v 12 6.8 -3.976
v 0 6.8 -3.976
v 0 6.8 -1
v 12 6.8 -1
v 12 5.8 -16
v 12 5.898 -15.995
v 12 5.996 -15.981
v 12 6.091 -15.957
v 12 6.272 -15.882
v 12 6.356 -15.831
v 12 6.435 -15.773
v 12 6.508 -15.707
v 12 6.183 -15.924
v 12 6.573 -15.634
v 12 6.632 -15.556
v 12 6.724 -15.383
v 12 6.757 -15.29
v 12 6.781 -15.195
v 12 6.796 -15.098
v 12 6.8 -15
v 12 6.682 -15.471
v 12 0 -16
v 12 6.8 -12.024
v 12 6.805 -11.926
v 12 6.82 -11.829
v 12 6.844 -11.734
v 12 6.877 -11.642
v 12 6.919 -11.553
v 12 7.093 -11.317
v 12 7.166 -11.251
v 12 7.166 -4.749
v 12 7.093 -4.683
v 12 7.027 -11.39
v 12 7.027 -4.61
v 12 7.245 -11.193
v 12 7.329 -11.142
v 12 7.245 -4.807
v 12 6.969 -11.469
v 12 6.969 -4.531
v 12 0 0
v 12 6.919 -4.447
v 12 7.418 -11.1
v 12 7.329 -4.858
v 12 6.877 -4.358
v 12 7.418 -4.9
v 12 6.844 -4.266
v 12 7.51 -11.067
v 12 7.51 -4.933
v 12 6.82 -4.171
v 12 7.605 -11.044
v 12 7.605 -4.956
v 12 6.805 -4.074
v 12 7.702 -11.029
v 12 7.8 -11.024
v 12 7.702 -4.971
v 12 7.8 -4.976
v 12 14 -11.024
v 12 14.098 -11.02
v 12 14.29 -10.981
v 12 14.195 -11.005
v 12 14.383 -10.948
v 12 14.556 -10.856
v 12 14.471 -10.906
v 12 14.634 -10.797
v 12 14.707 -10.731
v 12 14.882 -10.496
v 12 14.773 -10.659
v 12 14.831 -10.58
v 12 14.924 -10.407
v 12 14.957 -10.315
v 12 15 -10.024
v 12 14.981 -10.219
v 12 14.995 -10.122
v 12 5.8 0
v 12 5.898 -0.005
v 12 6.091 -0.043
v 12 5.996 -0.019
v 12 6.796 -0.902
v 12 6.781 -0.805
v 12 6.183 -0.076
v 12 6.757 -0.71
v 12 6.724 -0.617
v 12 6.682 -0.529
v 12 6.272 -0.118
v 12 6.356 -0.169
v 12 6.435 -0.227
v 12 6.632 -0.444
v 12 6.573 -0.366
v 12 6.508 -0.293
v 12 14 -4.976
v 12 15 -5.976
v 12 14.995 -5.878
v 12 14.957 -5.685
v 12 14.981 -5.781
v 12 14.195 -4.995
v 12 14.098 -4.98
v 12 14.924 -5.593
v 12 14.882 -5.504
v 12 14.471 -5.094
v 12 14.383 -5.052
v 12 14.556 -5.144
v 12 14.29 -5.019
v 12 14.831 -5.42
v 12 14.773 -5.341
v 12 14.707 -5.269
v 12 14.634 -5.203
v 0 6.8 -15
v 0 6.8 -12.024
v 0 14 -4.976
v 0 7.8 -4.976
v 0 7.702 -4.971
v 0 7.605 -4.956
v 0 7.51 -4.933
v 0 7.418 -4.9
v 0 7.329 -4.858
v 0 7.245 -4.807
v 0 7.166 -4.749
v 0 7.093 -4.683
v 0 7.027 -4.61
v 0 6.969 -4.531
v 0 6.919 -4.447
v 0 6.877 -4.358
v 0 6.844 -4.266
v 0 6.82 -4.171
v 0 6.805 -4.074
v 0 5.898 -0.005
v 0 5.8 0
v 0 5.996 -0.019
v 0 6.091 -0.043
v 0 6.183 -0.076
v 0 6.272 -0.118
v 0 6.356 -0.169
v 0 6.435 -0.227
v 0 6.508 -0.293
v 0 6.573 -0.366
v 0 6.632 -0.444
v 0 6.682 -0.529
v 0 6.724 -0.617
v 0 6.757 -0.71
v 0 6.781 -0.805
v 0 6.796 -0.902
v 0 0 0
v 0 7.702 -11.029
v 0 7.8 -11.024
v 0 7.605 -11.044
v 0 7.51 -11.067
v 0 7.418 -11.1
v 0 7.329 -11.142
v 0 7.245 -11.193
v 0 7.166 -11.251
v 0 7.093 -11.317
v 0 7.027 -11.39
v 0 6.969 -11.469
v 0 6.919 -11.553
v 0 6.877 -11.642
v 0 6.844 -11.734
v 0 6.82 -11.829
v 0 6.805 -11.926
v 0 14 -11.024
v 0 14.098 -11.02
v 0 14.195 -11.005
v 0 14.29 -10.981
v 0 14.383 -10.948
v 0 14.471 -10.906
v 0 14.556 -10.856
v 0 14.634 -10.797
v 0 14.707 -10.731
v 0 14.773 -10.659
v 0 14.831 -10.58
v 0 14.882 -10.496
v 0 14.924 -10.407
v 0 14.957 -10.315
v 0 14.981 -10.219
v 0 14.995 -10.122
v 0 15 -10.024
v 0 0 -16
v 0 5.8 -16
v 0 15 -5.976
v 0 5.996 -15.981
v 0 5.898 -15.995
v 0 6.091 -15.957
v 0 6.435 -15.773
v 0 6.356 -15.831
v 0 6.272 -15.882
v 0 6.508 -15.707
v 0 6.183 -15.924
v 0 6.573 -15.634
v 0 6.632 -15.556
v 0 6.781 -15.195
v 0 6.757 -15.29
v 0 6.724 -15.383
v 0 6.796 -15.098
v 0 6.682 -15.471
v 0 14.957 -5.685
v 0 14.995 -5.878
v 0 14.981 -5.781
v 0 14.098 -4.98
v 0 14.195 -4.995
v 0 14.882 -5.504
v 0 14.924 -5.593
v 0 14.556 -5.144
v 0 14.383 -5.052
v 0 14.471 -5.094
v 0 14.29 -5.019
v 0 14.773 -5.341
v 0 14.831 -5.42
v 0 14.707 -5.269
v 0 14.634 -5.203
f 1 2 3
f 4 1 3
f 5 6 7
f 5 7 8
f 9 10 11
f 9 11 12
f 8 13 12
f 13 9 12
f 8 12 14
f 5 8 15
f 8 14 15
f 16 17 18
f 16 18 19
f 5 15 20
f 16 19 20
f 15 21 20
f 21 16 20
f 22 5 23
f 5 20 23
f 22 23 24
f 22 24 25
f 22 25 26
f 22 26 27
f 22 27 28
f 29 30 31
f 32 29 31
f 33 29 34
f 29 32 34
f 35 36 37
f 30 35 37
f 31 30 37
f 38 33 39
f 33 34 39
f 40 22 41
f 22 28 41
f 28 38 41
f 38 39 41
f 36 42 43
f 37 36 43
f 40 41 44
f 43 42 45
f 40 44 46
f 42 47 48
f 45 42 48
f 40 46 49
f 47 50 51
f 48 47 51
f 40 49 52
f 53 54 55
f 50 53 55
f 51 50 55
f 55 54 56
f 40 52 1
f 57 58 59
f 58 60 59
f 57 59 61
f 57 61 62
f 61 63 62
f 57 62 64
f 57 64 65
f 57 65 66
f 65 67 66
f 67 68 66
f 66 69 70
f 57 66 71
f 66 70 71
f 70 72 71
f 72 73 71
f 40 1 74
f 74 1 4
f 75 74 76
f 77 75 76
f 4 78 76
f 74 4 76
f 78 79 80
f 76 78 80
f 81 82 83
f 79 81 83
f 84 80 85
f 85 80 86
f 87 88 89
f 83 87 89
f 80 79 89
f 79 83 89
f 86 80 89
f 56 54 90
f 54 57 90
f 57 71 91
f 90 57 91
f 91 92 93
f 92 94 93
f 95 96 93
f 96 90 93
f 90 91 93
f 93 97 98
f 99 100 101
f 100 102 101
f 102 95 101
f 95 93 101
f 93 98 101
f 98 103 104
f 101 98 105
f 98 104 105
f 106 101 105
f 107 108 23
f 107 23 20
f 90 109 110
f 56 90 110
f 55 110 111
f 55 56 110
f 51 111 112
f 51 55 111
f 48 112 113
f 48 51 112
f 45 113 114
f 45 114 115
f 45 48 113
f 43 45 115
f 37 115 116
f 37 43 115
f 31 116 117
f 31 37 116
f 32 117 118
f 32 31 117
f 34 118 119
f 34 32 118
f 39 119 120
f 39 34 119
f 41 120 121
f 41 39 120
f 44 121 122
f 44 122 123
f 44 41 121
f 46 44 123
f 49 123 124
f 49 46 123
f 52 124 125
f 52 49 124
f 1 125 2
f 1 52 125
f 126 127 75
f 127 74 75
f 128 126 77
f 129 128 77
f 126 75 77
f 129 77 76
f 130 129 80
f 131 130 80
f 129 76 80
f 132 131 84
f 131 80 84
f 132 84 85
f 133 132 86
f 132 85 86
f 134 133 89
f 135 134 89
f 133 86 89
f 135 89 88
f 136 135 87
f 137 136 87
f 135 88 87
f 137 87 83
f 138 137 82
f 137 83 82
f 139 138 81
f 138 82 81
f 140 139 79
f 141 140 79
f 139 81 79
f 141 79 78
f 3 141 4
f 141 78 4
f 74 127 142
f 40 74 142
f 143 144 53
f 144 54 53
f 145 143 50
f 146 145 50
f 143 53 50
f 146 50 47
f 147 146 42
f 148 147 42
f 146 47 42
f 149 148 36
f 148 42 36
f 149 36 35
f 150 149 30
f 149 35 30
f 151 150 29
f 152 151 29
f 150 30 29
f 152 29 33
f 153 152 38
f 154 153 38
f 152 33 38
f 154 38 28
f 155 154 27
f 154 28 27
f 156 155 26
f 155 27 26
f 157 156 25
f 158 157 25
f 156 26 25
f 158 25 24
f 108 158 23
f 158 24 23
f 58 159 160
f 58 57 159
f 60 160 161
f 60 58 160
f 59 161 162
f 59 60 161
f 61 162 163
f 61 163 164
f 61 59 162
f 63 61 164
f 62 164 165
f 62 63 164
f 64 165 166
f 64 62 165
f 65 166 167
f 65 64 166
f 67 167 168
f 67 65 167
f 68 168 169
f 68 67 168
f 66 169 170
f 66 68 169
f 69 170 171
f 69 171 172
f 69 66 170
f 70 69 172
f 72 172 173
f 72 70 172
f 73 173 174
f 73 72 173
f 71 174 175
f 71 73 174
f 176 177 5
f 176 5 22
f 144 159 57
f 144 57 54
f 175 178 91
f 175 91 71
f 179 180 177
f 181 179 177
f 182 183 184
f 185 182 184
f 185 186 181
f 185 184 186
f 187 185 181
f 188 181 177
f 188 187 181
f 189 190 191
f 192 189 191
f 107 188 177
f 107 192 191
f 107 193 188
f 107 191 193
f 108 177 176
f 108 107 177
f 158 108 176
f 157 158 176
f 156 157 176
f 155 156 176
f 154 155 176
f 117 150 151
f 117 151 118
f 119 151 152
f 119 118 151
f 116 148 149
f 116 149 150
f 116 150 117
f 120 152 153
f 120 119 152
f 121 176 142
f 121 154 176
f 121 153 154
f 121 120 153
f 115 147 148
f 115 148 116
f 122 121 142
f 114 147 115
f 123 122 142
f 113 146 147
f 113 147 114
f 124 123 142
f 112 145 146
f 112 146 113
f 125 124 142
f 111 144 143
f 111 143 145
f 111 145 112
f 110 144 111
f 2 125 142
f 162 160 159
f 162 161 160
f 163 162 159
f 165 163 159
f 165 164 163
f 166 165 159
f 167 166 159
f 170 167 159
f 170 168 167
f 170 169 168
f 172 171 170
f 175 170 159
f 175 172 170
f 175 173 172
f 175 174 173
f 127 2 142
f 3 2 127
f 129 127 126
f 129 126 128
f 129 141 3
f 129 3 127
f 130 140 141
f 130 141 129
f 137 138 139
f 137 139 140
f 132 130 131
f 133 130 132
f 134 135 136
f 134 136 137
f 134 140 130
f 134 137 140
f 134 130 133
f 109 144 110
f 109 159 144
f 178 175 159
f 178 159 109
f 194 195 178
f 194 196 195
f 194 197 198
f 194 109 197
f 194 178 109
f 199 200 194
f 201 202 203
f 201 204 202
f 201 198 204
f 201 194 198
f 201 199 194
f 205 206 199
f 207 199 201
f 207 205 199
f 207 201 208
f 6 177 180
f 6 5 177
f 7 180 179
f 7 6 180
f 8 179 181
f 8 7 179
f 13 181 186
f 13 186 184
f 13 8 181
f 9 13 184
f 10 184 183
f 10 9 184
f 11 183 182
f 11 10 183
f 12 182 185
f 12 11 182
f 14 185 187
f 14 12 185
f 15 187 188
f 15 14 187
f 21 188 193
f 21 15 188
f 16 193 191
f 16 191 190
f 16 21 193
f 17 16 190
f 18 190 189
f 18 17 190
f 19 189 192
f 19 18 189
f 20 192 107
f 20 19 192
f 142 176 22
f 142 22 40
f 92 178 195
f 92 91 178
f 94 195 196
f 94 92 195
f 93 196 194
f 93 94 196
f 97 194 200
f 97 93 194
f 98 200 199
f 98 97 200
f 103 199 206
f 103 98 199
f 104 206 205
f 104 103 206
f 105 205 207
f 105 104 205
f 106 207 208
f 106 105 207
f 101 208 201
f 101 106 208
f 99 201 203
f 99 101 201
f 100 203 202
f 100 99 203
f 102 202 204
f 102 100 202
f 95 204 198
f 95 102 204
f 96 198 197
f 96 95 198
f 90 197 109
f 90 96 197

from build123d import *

# Parameters (mm, degrees)
BOSS_EXTRUDE1_DEPTH  = 12
FILLET1_R            = 1
FILLET1_OF_MIRROR2_R = 1


with BuildPart() as part:
    # Sketch1 → Boss-Extrude1 (new body)
    with BuildSketch(Plane(origin=(0, 0, 0), x_dir=(0, 0, -1), z_dir=(1, 0, 0))):
        Polygon((0, 6.800479655), (0, 0), (8, 0), (8, 15), (4.975646797, 15), (4.975646797, 6.800479655), align=None)
    boss_extrude1 = extrude(amount=BOSS_EXTRUDE1_DEPTH)

    # Fillet1
    fillet1_edges = [part.edges().sort_by_distance(p)[0] for p in [
        (6, 6.800479655, 0),
        (6, 6.800479655, -4.975646797),
        (6, 15, -4.975646797),
    ]]
    fillet(fillet1_edges, radius=FILLET1_R)

    # Mirror2: Boss-Extrude1 across plane
    add(boss_extrude1.mirror(Plane(origin=(12, 0, -8), x_dir=(1, 0, 0), z_dir=(0, 0, 1))))

    # Fillet1 of Mirror2
    fillet1_of_mirror2_edges = [part.edges().sort_by_distance(p)[0] for p in [
        (6, 6.800479655, -16),
        (6, 6.800479655, -11.024353203),
        (6, 15, -11.024353203),
    ]]
    fillet(fillet1_of_mirror2_edges, radius=FILLET1_OF_MIRROR2_R)


solid = part.part
